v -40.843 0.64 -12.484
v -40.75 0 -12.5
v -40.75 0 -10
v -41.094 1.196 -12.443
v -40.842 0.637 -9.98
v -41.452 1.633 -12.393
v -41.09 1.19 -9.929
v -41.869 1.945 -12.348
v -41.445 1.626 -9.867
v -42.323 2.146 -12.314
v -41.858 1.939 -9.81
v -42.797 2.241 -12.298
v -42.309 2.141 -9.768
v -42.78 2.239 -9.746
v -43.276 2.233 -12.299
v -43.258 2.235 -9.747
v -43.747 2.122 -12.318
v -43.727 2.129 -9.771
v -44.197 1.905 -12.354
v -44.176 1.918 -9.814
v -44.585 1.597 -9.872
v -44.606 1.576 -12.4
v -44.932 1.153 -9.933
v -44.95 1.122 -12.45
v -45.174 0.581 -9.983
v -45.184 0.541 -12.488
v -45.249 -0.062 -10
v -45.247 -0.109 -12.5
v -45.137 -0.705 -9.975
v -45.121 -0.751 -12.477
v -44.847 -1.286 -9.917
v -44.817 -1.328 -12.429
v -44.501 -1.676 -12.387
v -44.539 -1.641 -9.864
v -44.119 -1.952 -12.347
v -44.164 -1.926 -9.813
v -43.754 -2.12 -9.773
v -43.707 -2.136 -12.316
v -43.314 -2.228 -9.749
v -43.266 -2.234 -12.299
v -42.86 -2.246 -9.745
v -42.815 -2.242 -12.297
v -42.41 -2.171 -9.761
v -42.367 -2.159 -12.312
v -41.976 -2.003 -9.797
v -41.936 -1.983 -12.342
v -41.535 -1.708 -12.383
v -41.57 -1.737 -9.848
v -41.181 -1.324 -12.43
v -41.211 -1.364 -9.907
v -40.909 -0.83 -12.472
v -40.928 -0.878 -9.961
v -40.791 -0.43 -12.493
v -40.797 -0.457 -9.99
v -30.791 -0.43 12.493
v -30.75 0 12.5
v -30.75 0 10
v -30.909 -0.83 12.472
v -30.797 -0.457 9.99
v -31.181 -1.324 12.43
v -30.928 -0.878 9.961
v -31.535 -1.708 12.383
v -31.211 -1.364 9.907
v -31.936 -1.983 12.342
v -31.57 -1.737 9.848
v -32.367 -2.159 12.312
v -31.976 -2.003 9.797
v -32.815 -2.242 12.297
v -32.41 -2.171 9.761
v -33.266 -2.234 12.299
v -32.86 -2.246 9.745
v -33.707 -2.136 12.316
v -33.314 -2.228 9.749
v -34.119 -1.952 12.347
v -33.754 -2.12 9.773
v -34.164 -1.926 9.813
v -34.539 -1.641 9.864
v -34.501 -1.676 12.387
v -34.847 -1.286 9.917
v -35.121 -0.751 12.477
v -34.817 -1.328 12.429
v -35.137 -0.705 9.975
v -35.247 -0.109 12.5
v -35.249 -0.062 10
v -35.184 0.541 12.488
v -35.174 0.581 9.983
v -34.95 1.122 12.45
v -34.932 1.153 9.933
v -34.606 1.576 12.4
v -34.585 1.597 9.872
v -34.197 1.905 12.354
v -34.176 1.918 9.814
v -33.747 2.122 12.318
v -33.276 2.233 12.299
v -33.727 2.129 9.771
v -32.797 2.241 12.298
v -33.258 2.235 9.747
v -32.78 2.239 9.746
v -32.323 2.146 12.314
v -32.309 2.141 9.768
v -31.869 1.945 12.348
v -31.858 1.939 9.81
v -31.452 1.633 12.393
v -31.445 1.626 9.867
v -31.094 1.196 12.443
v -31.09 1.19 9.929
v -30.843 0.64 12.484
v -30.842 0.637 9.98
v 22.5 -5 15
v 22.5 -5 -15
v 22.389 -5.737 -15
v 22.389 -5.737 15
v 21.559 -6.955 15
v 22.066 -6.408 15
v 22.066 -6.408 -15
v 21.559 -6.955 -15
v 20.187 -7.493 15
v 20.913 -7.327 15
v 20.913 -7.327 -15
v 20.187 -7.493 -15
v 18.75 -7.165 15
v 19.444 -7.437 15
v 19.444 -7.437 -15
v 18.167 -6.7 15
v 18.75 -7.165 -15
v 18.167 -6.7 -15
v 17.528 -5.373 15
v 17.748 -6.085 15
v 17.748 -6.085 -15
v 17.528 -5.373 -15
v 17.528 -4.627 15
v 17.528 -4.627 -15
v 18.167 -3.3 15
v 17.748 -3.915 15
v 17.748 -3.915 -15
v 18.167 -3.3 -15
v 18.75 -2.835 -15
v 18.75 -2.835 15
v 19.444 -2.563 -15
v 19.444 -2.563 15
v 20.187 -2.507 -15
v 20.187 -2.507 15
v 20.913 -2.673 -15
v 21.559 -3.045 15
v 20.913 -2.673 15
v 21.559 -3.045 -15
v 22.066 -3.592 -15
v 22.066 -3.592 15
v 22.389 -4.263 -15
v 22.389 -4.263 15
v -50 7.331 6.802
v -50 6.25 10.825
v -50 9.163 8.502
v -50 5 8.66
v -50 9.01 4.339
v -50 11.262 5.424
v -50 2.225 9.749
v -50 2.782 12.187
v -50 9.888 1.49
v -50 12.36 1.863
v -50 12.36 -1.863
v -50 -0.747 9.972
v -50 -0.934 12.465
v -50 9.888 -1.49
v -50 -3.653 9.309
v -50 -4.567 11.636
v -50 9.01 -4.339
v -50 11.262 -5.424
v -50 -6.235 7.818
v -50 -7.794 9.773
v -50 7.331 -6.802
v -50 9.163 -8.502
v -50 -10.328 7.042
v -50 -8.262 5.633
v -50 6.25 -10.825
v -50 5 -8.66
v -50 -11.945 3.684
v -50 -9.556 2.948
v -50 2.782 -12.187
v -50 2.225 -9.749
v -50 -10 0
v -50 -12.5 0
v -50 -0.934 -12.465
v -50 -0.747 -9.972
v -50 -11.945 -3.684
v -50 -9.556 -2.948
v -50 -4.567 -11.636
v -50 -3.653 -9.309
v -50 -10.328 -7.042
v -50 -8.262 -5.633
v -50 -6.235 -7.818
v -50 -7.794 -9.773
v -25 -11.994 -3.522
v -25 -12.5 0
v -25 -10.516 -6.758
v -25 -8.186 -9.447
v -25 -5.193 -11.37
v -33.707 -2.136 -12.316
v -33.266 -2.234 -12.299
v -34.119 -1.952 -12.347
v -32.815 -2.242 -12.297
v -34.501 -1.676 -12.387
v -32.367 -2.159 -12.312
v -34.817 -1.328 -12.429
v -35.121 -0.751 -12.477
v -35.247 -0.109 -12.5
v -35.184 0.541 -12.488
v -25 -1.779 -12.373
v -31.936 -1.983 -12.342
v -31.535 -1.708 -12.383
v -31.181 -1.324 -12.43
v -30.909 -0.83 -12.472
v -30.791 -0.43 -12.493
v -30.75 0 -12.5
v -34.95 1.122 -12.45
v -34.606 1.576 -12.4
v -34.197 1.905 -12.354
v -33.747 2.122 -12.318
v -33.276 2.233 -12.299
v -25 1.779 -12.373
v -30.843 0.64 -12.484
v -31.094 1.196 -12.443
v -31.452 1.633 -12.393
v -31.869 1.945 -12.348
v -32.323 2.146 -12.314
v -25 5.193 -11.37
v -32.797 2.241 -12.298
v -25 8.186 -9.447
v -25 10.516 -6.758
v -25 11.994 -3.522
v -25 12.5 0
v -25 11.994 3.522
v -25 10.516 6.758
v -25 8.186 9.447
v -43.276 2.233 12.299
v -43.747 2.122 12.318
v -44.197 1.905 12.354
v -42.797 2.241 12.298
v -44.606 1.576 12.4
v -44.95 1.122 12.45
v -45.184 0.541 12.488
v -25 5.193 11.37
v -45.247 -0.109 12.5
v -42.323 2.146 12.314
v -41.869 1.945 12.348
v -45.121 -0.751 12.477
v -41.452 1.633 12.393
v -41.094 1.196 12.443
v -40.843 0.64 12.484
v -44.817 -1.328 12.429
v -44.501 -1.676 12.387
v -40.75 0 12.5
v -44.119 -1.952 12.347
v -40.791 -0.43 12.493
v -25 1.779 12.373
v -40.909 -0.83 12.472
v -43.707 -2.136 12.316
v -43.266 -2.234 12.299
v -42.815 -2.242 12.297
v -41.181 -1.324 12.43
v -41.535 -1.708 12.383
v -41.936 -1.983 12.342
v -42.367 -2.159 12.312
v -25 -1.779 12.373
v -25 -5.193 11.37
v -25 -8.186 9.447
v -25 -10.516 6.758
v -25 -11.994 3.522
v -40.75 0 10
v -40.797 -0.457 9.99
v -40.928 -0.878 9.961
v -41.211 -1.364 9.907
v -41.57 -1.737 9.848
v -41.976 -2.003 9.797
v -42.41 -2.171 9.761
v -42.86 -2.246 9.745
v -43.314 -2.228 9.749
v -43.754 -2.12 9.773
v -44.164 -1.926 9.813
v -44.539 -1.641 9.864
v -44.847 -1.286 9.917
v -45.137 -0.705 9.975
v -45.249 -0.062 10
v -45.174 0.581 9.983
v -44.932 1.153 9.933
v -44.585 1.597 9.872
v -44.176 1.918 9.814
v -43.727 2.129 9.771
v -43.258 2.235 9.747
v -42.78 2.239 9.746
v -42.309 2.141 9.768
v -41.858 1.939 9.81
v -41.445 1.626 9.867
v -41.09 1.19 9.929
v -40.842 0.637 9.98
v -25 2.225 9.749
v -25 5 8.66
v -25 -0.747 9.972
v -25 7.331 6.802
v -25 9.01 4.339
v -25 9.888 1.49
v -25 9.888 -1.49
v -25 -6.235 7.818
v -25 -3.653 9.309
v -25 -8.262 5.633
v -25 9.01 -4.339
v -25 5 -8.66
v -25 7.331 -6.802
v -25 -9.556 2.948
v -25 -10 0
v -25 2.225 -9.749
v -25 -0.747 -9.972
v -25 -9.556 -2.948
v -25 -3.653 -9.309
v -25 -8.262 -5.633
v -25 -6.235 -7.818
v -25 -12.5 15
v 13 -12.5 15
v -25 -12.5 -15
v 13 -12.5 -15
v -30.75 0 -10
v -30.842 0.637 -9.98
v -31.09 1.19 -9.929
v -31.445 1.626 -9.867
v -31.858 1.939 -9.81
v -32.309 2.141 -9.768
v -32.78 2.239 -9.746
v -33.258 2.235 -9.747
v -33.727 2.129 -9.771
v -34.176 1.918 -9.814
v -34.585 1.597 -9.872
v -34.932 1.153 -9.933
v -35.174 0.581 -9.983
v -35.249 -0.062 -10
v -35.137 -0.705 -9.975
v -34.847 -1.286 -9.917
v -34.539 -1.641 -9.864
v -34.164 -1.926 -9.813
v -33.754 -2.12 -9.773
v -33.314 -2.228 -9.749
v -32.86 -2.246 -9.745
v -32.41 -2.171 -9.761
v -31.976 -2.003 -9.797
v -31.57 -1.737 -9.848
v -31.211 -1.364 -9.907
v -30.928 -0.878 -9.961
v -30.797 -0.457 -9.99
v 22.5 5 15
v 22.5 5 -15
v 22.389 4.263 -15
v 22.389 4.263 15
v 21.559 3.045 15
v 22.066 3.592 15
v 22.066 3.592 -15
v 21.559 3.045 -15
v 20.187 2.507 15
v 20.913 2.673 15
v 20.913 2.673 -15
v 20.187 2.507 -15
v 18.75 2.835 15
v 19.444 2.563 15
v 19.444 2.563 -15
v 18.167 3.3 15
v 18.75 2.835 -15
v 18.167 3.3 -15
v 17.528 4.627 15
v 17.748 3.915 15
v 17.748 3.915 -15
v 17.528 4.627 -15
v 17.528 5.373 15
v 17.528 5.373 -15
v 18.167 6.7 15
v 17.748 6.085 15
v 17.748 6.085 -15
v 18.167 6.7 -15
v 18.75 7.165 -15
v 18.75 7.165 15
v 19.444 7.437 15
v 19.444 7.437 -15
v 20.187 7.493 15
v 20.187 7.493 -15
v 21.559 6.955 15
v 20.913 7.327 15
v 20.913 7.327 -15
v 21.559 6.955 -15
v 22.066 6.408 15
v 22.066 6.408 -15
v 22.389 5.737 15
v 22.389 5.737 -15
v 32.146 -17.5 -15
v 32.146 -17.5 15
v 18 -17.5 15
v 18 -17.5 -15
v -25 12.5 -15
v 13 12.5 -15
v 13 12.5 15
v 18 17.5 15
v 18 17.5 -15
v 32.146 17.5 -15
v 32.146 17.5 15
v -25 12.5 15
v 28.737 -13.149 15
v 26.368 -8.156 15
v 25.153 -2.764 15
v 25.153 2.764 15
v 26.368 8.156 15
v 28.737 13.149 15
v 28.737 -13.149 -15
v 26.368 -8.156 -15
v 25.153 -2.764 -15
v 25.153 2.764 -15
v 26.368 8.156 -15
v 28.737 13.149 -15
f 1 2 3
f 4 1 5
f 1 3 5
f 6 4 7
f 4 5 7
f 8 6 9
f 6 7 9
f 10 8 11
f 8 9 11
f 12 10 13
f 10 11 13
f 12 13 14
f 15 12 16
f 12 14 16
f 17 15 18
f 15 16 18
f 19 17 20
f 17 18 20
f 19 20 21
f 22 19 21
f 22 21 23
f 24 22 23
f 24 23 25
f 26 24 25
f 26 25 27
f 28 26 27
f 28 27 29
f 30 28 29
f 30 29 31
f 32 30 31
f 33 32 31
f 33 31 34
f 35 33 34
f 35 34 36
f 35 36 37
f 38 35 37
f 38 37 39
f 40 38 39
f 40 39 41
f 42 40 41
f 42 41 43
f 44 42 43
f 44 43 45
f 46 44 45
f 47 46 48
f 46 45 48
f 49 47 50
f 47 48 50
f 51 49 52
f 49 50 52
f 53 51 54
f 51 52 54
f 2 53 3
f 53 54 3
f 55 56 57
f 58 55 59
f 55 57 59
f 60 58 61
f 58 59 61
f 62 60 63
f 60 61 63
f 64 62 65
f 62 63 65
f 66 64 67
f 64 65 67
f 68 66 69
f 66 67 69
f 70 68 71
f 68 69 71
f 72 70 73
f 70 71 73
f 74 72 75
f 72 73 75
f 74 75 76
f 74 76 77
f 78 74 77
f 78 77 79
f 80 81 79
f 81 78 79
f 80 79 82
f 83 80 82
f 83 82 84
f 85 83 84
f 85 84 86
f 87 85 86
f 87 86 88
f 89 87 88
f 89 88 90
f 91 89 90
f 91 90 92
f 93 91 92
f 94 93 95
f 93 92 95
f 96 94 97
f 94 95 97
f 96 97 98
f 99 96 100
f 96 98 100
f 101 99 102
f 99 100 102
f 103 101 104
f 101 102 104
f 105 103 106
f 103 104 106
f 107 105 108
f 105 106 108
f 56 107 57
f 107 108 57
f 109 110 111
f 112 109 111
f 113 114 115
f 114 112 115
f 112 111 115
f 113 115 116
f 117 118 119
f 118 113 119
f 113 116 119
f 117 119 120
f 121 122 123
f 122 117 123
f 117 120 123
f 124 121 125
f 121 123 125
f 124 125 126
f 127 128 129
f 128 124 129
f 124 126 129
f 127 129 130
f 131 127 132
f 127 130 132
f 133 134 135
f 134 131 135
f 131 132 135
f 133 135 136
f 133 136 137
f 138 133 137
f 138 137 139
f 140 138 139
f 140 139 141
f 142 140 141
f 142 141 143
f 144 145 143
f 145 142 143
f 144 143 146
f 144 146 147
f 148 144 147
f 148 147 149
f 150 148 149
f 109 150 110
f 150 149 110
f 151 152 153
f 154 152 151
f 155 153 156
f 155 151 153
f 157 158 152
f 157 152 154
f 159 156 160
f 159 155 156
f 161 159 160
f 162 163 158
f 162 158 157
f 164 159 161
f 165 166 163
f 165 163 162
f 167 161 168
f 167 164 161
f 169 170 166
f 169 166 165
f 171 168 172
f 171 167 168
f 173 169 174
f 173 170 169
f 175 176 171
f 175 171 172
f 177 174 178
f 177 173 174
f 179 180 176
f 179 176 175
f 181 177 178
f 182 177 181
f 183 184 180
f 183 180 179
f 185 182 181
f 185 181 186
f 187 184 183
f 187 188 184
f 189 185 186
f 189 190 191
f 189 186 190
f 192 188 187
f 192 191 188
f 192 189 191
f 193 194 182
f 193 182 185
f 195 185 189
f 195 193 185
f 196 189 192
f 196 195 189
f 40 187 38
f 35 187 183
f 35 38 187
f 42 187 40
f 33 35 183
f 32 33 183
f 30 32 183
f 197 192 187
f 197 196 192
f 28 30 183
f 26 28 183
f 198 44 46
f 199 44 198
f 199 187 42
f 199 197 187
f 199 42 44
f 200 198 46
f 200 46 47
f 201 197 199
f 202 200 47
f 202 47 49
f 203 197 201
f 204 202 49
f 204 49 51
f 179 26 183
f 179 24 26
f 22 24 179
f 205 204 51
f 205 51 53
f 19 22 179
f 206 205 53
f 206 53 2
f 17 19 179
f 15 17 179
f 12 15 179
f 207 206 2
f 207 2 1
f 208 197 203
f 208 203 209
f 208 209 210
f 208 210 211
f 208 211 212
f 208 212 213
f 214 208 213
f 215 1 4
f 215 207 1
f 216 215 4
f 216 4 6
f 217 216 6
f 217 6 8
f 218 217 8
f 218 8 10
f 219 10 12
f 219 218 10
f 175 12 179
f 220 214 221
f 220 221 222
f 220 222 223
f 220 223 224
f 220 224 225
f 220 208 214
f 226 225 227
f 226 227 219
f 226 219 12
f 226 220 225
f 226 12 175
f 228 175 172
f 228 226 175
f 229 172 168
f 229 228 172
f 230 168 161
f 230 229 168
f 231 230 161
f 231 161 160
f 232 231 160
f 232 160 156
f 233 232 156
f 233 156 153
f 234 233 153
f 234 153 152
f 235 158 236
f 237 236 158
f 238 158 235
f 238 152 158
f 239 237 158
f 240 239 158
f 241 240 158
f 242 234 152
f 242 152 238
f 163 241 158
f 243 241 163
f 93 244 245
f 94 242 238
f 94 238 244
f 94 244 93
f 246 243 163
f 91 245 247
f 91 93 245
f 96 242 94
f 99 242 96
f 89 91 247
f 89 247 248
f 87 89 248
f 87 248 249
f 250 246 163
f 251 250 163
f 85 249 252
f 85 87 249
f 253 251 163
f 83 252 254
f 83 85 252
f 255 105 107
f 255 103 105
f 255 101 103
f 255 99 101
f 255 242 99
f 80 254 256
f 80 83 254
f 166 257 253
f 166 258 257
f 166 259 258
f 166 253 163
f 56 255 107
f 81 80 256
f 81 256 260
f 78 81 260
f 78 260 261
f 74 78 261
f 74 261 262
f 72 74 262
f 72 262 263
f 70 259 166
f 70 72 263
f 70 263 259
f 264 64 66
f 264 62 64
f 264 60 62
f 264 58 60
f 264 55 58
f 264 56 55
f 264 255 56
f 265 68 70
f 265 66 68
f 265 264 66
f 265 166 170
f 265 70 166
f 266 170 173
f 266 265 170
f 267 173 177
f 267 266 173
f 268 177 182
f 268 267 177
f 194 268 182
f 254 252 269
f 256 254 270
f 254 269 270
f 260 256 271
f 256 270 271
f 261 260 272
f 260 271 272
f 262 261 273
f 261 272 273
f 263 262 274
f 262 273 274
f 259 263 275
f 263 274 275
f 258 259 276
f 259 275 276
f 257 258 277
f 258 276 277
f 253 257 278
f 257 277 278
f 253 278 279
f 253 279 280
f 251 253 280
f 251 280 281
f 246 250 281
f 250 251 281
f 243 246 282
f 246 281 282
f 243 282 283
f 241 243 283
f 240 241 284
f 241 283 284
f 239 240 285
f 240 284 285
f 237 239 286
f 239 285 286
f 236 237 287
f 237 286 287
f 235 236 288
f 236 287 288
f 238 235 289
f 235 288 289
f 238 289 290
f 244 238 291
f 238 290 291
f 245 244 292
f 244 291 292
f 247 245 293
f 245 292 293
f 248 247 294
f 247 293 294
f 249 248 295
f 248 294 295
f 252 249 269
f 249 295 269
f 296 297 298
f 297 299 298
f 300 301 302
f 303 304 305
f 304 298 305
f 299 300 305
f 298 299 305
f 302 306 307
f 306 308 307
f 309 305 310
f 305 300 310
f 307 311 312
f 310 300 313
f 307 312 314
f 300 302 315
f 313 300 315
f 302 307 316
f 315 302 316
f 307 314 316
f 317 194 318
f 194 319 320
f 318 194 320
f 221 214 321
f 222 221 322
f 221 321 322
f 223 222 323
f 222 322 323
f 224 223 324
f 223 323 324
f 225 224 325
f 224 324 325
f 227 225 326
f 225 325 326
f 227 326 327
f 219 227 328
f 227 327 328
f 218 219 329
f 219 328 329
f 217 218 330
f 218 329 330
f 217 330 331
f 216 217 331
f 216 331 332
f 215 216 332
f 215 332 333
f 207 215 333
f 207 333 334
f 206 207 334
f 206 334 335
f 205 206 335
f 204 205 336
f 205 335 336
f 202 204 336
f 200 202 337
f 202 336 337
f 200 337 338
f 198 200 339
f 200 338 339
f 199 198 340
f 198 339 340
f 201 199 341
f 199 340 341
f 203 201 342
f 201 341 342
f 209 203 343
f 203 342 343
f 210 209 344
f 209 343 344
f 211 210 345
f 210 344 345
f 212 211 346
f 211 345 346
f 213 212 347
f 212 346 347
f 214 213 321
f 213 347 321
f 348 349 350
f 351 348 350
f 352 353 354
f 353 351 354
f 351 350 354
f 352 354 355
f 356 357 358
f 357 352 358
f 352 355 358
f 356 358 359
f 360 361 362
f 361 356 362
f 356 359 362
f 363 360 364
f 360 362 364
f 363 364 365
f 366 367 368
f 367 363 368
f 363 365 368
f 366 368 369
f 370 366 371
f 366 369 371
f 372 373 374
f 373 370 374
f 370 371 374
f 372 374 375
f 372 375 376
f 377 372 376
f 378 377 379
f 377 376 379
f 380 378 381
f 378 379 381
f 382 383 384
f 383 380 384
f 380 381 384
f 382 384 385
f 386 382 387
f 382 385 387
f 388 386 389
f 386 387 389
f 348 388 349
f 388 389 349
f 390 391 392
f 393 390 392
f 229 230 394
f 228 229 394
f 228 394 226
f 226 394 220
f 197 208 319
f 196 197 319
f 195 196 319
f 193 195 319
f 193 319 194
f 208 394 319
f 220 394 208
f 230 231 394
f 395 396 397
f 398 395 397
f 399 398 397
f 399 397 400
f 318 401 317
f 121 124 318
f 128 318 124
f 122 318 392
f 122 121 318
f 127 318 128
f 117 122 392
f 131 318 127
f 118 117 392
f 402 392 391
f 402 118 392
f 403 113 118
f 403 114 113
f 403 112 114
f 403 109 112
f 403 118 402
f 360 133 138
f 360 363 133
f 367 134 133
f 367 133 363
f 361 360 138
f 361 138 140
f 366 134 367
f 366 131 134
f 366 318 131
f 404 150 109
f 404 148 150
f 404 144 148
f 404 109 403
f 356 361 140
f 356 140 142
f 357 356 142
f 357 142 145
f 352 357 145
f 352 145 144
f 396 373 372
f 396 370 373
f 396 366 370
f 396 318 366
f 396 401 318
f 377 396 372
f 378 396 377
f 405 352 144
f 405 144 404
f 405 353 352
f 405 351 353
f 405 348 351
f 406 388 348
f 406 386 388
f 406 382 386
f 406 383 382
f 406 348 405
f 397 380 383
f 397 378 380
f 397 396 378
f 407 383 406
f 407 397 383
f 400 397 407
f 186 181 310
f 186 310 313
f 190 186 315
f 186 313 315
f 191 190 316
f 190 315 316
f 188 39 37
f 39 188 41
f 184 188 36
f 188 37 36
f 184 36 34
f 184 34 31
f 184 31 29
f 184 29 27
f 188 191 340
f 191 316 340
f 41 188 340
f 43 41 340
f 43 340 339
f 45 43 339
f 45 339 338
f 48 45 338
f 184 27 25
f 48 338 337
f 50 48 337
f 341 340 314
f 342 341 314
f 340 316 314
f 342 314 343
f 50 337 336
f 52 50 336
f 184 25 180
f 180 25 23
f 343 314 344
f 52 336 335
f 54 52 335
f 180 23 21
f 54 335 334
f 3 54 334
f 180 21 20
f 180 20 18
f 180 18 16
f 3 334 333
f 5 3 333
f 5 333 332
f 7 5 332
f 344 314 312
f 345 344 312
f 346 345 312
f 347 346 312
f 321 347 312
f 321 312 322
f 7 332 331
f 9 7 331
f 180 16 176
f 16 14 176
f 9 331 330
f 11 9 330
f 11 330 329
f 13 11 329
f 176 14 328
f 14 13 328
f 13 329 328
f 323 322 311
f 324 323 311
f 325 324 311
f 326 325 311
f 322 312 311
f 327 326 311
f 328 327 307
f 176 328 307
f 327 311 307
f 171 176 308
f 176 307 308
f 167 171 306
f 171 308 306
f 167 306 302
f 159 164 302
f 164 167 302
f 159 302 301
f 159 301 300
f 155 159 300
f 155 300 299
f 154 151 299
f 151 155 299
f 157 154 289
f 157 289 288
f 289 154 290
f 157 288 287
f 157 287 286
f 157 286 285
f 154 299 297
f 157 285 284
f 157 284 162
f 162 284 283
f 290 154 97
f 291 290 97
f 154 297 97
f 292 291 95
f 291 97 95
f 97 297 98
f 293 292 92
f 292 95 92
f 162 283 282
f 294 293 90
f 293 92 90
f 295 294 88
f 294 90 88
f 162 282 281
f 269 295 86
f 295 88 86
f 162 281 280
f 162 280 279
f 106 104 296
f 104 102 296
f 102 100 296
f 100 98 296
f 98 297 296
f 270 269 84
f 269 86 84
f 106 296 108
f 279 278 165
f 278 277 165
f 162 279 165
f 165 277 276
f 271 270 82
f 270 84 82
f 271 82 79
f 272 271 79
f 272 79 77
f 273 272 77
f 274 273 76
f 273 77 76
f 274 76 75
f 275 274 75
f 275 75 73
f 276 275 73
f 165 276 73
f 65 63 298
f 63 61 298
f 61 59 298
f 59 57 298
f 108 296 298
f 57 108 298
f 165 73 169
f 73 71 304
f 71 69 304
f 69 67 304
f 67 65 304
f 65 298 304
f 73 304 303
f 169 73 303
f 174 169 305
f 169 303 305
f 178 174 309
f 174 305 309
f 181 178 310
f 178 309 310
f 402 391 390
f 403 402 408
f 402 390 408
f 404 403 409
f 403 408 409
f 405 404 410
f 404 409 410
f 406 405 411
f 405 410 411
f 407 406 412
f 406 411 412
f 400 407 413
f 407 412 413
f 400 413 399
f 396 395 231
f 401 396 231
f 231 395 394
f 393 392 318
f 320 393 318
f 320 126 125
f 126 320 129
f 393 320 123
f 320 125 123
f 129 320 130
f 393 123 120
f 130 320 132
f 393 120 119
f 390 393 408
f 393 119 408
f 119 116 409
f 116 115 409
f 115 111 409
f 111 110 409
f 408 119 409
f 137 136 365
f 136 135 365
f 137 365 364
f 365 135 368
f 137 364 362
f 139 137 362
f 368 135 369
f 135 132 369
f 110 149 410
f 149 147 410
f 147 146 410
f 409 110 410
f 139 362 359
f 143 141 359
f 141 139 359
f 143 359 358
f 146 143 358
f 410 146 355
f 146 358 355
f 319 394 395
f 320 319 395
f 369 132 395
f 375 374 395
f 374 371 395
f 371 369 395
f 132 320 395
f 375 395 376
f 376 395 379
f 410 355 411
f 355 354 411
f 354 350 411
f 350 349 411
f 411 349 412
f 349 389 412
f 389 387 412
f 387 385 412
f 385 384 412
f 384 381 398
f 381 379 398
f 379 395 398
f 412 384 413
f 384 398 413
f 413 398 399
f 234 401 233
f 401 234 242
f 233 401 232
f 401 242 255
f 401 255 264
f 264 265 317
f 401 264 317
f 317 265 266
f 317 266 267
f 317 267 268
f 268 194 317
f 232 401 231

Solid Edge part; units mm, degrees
sketch "Sketch1" plane through (0, 0, 0) normal (0, 0, 1) x (1, 0, 0)
  line L0 (-25, -12.5) -> (25, -12.5)
  line L1 (25, -12.5) -> (25, 12.5)
  line L2 (25, 12.5) -> (-25, 12.5)
  line L3 (-25, 12.5) -> (-25, -12.5)
  circle A0 centre (20, 5) radius 2.5
  circle A1 centre (20, -5) radius 2.5
extrude "Protrusion1" add sketch "Sketch1" along normal mid plane 30
sketch "Sketch2" plane through (-25, 0, 0) normal (-1, 0, 0) x (0, -1, 0)
  circle A0 centre (0, 0) radius 10
  circle A1 centre (0, 0) radius 12.5
extrude "ExtrudedProtrusion_2" add sketch "Sketch2" along normal mid plane 50
sketch "Sketch3" plane through (0, 0, 0) normal (0, 0, 1) x (1, 0, 0)
  arc A0 (32.1464, 17.5) -> (32.1464, -17.5) centre (50, 0) ccw
  line L0 (32.1464, -17.5) -> (18, -17.5)
  line L1 (18, -17.5) -> (13, -12.5)
  line L2 (13, -12.5) -> (22.5, -12.5)
  line L3 (22.5, -12.5) -> (22.5, 12.5)
  line L4 (22.5, 12.5) -> (13, 12.5)
  line L5 (13, 12.5) -> (18, 17.5)
  line L6 (18, 17.5) -> (32.1464, 17.5)
extrude "Protrusion2" add sketch "Sketch3" along normal mid plane 30
sketch "Sketch4" plane through (0, 0, 0) normal (0, 0, 1) x (1, 0, 0)
  circle A0 centre (-43, 0) radius 2.25
  circle A1 centre (-33, 0) radius 2.25
extrude "ExtrudedCutout_1" cut sketch "Sketch4" along normal mid plane 87.851
properties material "PVC"
